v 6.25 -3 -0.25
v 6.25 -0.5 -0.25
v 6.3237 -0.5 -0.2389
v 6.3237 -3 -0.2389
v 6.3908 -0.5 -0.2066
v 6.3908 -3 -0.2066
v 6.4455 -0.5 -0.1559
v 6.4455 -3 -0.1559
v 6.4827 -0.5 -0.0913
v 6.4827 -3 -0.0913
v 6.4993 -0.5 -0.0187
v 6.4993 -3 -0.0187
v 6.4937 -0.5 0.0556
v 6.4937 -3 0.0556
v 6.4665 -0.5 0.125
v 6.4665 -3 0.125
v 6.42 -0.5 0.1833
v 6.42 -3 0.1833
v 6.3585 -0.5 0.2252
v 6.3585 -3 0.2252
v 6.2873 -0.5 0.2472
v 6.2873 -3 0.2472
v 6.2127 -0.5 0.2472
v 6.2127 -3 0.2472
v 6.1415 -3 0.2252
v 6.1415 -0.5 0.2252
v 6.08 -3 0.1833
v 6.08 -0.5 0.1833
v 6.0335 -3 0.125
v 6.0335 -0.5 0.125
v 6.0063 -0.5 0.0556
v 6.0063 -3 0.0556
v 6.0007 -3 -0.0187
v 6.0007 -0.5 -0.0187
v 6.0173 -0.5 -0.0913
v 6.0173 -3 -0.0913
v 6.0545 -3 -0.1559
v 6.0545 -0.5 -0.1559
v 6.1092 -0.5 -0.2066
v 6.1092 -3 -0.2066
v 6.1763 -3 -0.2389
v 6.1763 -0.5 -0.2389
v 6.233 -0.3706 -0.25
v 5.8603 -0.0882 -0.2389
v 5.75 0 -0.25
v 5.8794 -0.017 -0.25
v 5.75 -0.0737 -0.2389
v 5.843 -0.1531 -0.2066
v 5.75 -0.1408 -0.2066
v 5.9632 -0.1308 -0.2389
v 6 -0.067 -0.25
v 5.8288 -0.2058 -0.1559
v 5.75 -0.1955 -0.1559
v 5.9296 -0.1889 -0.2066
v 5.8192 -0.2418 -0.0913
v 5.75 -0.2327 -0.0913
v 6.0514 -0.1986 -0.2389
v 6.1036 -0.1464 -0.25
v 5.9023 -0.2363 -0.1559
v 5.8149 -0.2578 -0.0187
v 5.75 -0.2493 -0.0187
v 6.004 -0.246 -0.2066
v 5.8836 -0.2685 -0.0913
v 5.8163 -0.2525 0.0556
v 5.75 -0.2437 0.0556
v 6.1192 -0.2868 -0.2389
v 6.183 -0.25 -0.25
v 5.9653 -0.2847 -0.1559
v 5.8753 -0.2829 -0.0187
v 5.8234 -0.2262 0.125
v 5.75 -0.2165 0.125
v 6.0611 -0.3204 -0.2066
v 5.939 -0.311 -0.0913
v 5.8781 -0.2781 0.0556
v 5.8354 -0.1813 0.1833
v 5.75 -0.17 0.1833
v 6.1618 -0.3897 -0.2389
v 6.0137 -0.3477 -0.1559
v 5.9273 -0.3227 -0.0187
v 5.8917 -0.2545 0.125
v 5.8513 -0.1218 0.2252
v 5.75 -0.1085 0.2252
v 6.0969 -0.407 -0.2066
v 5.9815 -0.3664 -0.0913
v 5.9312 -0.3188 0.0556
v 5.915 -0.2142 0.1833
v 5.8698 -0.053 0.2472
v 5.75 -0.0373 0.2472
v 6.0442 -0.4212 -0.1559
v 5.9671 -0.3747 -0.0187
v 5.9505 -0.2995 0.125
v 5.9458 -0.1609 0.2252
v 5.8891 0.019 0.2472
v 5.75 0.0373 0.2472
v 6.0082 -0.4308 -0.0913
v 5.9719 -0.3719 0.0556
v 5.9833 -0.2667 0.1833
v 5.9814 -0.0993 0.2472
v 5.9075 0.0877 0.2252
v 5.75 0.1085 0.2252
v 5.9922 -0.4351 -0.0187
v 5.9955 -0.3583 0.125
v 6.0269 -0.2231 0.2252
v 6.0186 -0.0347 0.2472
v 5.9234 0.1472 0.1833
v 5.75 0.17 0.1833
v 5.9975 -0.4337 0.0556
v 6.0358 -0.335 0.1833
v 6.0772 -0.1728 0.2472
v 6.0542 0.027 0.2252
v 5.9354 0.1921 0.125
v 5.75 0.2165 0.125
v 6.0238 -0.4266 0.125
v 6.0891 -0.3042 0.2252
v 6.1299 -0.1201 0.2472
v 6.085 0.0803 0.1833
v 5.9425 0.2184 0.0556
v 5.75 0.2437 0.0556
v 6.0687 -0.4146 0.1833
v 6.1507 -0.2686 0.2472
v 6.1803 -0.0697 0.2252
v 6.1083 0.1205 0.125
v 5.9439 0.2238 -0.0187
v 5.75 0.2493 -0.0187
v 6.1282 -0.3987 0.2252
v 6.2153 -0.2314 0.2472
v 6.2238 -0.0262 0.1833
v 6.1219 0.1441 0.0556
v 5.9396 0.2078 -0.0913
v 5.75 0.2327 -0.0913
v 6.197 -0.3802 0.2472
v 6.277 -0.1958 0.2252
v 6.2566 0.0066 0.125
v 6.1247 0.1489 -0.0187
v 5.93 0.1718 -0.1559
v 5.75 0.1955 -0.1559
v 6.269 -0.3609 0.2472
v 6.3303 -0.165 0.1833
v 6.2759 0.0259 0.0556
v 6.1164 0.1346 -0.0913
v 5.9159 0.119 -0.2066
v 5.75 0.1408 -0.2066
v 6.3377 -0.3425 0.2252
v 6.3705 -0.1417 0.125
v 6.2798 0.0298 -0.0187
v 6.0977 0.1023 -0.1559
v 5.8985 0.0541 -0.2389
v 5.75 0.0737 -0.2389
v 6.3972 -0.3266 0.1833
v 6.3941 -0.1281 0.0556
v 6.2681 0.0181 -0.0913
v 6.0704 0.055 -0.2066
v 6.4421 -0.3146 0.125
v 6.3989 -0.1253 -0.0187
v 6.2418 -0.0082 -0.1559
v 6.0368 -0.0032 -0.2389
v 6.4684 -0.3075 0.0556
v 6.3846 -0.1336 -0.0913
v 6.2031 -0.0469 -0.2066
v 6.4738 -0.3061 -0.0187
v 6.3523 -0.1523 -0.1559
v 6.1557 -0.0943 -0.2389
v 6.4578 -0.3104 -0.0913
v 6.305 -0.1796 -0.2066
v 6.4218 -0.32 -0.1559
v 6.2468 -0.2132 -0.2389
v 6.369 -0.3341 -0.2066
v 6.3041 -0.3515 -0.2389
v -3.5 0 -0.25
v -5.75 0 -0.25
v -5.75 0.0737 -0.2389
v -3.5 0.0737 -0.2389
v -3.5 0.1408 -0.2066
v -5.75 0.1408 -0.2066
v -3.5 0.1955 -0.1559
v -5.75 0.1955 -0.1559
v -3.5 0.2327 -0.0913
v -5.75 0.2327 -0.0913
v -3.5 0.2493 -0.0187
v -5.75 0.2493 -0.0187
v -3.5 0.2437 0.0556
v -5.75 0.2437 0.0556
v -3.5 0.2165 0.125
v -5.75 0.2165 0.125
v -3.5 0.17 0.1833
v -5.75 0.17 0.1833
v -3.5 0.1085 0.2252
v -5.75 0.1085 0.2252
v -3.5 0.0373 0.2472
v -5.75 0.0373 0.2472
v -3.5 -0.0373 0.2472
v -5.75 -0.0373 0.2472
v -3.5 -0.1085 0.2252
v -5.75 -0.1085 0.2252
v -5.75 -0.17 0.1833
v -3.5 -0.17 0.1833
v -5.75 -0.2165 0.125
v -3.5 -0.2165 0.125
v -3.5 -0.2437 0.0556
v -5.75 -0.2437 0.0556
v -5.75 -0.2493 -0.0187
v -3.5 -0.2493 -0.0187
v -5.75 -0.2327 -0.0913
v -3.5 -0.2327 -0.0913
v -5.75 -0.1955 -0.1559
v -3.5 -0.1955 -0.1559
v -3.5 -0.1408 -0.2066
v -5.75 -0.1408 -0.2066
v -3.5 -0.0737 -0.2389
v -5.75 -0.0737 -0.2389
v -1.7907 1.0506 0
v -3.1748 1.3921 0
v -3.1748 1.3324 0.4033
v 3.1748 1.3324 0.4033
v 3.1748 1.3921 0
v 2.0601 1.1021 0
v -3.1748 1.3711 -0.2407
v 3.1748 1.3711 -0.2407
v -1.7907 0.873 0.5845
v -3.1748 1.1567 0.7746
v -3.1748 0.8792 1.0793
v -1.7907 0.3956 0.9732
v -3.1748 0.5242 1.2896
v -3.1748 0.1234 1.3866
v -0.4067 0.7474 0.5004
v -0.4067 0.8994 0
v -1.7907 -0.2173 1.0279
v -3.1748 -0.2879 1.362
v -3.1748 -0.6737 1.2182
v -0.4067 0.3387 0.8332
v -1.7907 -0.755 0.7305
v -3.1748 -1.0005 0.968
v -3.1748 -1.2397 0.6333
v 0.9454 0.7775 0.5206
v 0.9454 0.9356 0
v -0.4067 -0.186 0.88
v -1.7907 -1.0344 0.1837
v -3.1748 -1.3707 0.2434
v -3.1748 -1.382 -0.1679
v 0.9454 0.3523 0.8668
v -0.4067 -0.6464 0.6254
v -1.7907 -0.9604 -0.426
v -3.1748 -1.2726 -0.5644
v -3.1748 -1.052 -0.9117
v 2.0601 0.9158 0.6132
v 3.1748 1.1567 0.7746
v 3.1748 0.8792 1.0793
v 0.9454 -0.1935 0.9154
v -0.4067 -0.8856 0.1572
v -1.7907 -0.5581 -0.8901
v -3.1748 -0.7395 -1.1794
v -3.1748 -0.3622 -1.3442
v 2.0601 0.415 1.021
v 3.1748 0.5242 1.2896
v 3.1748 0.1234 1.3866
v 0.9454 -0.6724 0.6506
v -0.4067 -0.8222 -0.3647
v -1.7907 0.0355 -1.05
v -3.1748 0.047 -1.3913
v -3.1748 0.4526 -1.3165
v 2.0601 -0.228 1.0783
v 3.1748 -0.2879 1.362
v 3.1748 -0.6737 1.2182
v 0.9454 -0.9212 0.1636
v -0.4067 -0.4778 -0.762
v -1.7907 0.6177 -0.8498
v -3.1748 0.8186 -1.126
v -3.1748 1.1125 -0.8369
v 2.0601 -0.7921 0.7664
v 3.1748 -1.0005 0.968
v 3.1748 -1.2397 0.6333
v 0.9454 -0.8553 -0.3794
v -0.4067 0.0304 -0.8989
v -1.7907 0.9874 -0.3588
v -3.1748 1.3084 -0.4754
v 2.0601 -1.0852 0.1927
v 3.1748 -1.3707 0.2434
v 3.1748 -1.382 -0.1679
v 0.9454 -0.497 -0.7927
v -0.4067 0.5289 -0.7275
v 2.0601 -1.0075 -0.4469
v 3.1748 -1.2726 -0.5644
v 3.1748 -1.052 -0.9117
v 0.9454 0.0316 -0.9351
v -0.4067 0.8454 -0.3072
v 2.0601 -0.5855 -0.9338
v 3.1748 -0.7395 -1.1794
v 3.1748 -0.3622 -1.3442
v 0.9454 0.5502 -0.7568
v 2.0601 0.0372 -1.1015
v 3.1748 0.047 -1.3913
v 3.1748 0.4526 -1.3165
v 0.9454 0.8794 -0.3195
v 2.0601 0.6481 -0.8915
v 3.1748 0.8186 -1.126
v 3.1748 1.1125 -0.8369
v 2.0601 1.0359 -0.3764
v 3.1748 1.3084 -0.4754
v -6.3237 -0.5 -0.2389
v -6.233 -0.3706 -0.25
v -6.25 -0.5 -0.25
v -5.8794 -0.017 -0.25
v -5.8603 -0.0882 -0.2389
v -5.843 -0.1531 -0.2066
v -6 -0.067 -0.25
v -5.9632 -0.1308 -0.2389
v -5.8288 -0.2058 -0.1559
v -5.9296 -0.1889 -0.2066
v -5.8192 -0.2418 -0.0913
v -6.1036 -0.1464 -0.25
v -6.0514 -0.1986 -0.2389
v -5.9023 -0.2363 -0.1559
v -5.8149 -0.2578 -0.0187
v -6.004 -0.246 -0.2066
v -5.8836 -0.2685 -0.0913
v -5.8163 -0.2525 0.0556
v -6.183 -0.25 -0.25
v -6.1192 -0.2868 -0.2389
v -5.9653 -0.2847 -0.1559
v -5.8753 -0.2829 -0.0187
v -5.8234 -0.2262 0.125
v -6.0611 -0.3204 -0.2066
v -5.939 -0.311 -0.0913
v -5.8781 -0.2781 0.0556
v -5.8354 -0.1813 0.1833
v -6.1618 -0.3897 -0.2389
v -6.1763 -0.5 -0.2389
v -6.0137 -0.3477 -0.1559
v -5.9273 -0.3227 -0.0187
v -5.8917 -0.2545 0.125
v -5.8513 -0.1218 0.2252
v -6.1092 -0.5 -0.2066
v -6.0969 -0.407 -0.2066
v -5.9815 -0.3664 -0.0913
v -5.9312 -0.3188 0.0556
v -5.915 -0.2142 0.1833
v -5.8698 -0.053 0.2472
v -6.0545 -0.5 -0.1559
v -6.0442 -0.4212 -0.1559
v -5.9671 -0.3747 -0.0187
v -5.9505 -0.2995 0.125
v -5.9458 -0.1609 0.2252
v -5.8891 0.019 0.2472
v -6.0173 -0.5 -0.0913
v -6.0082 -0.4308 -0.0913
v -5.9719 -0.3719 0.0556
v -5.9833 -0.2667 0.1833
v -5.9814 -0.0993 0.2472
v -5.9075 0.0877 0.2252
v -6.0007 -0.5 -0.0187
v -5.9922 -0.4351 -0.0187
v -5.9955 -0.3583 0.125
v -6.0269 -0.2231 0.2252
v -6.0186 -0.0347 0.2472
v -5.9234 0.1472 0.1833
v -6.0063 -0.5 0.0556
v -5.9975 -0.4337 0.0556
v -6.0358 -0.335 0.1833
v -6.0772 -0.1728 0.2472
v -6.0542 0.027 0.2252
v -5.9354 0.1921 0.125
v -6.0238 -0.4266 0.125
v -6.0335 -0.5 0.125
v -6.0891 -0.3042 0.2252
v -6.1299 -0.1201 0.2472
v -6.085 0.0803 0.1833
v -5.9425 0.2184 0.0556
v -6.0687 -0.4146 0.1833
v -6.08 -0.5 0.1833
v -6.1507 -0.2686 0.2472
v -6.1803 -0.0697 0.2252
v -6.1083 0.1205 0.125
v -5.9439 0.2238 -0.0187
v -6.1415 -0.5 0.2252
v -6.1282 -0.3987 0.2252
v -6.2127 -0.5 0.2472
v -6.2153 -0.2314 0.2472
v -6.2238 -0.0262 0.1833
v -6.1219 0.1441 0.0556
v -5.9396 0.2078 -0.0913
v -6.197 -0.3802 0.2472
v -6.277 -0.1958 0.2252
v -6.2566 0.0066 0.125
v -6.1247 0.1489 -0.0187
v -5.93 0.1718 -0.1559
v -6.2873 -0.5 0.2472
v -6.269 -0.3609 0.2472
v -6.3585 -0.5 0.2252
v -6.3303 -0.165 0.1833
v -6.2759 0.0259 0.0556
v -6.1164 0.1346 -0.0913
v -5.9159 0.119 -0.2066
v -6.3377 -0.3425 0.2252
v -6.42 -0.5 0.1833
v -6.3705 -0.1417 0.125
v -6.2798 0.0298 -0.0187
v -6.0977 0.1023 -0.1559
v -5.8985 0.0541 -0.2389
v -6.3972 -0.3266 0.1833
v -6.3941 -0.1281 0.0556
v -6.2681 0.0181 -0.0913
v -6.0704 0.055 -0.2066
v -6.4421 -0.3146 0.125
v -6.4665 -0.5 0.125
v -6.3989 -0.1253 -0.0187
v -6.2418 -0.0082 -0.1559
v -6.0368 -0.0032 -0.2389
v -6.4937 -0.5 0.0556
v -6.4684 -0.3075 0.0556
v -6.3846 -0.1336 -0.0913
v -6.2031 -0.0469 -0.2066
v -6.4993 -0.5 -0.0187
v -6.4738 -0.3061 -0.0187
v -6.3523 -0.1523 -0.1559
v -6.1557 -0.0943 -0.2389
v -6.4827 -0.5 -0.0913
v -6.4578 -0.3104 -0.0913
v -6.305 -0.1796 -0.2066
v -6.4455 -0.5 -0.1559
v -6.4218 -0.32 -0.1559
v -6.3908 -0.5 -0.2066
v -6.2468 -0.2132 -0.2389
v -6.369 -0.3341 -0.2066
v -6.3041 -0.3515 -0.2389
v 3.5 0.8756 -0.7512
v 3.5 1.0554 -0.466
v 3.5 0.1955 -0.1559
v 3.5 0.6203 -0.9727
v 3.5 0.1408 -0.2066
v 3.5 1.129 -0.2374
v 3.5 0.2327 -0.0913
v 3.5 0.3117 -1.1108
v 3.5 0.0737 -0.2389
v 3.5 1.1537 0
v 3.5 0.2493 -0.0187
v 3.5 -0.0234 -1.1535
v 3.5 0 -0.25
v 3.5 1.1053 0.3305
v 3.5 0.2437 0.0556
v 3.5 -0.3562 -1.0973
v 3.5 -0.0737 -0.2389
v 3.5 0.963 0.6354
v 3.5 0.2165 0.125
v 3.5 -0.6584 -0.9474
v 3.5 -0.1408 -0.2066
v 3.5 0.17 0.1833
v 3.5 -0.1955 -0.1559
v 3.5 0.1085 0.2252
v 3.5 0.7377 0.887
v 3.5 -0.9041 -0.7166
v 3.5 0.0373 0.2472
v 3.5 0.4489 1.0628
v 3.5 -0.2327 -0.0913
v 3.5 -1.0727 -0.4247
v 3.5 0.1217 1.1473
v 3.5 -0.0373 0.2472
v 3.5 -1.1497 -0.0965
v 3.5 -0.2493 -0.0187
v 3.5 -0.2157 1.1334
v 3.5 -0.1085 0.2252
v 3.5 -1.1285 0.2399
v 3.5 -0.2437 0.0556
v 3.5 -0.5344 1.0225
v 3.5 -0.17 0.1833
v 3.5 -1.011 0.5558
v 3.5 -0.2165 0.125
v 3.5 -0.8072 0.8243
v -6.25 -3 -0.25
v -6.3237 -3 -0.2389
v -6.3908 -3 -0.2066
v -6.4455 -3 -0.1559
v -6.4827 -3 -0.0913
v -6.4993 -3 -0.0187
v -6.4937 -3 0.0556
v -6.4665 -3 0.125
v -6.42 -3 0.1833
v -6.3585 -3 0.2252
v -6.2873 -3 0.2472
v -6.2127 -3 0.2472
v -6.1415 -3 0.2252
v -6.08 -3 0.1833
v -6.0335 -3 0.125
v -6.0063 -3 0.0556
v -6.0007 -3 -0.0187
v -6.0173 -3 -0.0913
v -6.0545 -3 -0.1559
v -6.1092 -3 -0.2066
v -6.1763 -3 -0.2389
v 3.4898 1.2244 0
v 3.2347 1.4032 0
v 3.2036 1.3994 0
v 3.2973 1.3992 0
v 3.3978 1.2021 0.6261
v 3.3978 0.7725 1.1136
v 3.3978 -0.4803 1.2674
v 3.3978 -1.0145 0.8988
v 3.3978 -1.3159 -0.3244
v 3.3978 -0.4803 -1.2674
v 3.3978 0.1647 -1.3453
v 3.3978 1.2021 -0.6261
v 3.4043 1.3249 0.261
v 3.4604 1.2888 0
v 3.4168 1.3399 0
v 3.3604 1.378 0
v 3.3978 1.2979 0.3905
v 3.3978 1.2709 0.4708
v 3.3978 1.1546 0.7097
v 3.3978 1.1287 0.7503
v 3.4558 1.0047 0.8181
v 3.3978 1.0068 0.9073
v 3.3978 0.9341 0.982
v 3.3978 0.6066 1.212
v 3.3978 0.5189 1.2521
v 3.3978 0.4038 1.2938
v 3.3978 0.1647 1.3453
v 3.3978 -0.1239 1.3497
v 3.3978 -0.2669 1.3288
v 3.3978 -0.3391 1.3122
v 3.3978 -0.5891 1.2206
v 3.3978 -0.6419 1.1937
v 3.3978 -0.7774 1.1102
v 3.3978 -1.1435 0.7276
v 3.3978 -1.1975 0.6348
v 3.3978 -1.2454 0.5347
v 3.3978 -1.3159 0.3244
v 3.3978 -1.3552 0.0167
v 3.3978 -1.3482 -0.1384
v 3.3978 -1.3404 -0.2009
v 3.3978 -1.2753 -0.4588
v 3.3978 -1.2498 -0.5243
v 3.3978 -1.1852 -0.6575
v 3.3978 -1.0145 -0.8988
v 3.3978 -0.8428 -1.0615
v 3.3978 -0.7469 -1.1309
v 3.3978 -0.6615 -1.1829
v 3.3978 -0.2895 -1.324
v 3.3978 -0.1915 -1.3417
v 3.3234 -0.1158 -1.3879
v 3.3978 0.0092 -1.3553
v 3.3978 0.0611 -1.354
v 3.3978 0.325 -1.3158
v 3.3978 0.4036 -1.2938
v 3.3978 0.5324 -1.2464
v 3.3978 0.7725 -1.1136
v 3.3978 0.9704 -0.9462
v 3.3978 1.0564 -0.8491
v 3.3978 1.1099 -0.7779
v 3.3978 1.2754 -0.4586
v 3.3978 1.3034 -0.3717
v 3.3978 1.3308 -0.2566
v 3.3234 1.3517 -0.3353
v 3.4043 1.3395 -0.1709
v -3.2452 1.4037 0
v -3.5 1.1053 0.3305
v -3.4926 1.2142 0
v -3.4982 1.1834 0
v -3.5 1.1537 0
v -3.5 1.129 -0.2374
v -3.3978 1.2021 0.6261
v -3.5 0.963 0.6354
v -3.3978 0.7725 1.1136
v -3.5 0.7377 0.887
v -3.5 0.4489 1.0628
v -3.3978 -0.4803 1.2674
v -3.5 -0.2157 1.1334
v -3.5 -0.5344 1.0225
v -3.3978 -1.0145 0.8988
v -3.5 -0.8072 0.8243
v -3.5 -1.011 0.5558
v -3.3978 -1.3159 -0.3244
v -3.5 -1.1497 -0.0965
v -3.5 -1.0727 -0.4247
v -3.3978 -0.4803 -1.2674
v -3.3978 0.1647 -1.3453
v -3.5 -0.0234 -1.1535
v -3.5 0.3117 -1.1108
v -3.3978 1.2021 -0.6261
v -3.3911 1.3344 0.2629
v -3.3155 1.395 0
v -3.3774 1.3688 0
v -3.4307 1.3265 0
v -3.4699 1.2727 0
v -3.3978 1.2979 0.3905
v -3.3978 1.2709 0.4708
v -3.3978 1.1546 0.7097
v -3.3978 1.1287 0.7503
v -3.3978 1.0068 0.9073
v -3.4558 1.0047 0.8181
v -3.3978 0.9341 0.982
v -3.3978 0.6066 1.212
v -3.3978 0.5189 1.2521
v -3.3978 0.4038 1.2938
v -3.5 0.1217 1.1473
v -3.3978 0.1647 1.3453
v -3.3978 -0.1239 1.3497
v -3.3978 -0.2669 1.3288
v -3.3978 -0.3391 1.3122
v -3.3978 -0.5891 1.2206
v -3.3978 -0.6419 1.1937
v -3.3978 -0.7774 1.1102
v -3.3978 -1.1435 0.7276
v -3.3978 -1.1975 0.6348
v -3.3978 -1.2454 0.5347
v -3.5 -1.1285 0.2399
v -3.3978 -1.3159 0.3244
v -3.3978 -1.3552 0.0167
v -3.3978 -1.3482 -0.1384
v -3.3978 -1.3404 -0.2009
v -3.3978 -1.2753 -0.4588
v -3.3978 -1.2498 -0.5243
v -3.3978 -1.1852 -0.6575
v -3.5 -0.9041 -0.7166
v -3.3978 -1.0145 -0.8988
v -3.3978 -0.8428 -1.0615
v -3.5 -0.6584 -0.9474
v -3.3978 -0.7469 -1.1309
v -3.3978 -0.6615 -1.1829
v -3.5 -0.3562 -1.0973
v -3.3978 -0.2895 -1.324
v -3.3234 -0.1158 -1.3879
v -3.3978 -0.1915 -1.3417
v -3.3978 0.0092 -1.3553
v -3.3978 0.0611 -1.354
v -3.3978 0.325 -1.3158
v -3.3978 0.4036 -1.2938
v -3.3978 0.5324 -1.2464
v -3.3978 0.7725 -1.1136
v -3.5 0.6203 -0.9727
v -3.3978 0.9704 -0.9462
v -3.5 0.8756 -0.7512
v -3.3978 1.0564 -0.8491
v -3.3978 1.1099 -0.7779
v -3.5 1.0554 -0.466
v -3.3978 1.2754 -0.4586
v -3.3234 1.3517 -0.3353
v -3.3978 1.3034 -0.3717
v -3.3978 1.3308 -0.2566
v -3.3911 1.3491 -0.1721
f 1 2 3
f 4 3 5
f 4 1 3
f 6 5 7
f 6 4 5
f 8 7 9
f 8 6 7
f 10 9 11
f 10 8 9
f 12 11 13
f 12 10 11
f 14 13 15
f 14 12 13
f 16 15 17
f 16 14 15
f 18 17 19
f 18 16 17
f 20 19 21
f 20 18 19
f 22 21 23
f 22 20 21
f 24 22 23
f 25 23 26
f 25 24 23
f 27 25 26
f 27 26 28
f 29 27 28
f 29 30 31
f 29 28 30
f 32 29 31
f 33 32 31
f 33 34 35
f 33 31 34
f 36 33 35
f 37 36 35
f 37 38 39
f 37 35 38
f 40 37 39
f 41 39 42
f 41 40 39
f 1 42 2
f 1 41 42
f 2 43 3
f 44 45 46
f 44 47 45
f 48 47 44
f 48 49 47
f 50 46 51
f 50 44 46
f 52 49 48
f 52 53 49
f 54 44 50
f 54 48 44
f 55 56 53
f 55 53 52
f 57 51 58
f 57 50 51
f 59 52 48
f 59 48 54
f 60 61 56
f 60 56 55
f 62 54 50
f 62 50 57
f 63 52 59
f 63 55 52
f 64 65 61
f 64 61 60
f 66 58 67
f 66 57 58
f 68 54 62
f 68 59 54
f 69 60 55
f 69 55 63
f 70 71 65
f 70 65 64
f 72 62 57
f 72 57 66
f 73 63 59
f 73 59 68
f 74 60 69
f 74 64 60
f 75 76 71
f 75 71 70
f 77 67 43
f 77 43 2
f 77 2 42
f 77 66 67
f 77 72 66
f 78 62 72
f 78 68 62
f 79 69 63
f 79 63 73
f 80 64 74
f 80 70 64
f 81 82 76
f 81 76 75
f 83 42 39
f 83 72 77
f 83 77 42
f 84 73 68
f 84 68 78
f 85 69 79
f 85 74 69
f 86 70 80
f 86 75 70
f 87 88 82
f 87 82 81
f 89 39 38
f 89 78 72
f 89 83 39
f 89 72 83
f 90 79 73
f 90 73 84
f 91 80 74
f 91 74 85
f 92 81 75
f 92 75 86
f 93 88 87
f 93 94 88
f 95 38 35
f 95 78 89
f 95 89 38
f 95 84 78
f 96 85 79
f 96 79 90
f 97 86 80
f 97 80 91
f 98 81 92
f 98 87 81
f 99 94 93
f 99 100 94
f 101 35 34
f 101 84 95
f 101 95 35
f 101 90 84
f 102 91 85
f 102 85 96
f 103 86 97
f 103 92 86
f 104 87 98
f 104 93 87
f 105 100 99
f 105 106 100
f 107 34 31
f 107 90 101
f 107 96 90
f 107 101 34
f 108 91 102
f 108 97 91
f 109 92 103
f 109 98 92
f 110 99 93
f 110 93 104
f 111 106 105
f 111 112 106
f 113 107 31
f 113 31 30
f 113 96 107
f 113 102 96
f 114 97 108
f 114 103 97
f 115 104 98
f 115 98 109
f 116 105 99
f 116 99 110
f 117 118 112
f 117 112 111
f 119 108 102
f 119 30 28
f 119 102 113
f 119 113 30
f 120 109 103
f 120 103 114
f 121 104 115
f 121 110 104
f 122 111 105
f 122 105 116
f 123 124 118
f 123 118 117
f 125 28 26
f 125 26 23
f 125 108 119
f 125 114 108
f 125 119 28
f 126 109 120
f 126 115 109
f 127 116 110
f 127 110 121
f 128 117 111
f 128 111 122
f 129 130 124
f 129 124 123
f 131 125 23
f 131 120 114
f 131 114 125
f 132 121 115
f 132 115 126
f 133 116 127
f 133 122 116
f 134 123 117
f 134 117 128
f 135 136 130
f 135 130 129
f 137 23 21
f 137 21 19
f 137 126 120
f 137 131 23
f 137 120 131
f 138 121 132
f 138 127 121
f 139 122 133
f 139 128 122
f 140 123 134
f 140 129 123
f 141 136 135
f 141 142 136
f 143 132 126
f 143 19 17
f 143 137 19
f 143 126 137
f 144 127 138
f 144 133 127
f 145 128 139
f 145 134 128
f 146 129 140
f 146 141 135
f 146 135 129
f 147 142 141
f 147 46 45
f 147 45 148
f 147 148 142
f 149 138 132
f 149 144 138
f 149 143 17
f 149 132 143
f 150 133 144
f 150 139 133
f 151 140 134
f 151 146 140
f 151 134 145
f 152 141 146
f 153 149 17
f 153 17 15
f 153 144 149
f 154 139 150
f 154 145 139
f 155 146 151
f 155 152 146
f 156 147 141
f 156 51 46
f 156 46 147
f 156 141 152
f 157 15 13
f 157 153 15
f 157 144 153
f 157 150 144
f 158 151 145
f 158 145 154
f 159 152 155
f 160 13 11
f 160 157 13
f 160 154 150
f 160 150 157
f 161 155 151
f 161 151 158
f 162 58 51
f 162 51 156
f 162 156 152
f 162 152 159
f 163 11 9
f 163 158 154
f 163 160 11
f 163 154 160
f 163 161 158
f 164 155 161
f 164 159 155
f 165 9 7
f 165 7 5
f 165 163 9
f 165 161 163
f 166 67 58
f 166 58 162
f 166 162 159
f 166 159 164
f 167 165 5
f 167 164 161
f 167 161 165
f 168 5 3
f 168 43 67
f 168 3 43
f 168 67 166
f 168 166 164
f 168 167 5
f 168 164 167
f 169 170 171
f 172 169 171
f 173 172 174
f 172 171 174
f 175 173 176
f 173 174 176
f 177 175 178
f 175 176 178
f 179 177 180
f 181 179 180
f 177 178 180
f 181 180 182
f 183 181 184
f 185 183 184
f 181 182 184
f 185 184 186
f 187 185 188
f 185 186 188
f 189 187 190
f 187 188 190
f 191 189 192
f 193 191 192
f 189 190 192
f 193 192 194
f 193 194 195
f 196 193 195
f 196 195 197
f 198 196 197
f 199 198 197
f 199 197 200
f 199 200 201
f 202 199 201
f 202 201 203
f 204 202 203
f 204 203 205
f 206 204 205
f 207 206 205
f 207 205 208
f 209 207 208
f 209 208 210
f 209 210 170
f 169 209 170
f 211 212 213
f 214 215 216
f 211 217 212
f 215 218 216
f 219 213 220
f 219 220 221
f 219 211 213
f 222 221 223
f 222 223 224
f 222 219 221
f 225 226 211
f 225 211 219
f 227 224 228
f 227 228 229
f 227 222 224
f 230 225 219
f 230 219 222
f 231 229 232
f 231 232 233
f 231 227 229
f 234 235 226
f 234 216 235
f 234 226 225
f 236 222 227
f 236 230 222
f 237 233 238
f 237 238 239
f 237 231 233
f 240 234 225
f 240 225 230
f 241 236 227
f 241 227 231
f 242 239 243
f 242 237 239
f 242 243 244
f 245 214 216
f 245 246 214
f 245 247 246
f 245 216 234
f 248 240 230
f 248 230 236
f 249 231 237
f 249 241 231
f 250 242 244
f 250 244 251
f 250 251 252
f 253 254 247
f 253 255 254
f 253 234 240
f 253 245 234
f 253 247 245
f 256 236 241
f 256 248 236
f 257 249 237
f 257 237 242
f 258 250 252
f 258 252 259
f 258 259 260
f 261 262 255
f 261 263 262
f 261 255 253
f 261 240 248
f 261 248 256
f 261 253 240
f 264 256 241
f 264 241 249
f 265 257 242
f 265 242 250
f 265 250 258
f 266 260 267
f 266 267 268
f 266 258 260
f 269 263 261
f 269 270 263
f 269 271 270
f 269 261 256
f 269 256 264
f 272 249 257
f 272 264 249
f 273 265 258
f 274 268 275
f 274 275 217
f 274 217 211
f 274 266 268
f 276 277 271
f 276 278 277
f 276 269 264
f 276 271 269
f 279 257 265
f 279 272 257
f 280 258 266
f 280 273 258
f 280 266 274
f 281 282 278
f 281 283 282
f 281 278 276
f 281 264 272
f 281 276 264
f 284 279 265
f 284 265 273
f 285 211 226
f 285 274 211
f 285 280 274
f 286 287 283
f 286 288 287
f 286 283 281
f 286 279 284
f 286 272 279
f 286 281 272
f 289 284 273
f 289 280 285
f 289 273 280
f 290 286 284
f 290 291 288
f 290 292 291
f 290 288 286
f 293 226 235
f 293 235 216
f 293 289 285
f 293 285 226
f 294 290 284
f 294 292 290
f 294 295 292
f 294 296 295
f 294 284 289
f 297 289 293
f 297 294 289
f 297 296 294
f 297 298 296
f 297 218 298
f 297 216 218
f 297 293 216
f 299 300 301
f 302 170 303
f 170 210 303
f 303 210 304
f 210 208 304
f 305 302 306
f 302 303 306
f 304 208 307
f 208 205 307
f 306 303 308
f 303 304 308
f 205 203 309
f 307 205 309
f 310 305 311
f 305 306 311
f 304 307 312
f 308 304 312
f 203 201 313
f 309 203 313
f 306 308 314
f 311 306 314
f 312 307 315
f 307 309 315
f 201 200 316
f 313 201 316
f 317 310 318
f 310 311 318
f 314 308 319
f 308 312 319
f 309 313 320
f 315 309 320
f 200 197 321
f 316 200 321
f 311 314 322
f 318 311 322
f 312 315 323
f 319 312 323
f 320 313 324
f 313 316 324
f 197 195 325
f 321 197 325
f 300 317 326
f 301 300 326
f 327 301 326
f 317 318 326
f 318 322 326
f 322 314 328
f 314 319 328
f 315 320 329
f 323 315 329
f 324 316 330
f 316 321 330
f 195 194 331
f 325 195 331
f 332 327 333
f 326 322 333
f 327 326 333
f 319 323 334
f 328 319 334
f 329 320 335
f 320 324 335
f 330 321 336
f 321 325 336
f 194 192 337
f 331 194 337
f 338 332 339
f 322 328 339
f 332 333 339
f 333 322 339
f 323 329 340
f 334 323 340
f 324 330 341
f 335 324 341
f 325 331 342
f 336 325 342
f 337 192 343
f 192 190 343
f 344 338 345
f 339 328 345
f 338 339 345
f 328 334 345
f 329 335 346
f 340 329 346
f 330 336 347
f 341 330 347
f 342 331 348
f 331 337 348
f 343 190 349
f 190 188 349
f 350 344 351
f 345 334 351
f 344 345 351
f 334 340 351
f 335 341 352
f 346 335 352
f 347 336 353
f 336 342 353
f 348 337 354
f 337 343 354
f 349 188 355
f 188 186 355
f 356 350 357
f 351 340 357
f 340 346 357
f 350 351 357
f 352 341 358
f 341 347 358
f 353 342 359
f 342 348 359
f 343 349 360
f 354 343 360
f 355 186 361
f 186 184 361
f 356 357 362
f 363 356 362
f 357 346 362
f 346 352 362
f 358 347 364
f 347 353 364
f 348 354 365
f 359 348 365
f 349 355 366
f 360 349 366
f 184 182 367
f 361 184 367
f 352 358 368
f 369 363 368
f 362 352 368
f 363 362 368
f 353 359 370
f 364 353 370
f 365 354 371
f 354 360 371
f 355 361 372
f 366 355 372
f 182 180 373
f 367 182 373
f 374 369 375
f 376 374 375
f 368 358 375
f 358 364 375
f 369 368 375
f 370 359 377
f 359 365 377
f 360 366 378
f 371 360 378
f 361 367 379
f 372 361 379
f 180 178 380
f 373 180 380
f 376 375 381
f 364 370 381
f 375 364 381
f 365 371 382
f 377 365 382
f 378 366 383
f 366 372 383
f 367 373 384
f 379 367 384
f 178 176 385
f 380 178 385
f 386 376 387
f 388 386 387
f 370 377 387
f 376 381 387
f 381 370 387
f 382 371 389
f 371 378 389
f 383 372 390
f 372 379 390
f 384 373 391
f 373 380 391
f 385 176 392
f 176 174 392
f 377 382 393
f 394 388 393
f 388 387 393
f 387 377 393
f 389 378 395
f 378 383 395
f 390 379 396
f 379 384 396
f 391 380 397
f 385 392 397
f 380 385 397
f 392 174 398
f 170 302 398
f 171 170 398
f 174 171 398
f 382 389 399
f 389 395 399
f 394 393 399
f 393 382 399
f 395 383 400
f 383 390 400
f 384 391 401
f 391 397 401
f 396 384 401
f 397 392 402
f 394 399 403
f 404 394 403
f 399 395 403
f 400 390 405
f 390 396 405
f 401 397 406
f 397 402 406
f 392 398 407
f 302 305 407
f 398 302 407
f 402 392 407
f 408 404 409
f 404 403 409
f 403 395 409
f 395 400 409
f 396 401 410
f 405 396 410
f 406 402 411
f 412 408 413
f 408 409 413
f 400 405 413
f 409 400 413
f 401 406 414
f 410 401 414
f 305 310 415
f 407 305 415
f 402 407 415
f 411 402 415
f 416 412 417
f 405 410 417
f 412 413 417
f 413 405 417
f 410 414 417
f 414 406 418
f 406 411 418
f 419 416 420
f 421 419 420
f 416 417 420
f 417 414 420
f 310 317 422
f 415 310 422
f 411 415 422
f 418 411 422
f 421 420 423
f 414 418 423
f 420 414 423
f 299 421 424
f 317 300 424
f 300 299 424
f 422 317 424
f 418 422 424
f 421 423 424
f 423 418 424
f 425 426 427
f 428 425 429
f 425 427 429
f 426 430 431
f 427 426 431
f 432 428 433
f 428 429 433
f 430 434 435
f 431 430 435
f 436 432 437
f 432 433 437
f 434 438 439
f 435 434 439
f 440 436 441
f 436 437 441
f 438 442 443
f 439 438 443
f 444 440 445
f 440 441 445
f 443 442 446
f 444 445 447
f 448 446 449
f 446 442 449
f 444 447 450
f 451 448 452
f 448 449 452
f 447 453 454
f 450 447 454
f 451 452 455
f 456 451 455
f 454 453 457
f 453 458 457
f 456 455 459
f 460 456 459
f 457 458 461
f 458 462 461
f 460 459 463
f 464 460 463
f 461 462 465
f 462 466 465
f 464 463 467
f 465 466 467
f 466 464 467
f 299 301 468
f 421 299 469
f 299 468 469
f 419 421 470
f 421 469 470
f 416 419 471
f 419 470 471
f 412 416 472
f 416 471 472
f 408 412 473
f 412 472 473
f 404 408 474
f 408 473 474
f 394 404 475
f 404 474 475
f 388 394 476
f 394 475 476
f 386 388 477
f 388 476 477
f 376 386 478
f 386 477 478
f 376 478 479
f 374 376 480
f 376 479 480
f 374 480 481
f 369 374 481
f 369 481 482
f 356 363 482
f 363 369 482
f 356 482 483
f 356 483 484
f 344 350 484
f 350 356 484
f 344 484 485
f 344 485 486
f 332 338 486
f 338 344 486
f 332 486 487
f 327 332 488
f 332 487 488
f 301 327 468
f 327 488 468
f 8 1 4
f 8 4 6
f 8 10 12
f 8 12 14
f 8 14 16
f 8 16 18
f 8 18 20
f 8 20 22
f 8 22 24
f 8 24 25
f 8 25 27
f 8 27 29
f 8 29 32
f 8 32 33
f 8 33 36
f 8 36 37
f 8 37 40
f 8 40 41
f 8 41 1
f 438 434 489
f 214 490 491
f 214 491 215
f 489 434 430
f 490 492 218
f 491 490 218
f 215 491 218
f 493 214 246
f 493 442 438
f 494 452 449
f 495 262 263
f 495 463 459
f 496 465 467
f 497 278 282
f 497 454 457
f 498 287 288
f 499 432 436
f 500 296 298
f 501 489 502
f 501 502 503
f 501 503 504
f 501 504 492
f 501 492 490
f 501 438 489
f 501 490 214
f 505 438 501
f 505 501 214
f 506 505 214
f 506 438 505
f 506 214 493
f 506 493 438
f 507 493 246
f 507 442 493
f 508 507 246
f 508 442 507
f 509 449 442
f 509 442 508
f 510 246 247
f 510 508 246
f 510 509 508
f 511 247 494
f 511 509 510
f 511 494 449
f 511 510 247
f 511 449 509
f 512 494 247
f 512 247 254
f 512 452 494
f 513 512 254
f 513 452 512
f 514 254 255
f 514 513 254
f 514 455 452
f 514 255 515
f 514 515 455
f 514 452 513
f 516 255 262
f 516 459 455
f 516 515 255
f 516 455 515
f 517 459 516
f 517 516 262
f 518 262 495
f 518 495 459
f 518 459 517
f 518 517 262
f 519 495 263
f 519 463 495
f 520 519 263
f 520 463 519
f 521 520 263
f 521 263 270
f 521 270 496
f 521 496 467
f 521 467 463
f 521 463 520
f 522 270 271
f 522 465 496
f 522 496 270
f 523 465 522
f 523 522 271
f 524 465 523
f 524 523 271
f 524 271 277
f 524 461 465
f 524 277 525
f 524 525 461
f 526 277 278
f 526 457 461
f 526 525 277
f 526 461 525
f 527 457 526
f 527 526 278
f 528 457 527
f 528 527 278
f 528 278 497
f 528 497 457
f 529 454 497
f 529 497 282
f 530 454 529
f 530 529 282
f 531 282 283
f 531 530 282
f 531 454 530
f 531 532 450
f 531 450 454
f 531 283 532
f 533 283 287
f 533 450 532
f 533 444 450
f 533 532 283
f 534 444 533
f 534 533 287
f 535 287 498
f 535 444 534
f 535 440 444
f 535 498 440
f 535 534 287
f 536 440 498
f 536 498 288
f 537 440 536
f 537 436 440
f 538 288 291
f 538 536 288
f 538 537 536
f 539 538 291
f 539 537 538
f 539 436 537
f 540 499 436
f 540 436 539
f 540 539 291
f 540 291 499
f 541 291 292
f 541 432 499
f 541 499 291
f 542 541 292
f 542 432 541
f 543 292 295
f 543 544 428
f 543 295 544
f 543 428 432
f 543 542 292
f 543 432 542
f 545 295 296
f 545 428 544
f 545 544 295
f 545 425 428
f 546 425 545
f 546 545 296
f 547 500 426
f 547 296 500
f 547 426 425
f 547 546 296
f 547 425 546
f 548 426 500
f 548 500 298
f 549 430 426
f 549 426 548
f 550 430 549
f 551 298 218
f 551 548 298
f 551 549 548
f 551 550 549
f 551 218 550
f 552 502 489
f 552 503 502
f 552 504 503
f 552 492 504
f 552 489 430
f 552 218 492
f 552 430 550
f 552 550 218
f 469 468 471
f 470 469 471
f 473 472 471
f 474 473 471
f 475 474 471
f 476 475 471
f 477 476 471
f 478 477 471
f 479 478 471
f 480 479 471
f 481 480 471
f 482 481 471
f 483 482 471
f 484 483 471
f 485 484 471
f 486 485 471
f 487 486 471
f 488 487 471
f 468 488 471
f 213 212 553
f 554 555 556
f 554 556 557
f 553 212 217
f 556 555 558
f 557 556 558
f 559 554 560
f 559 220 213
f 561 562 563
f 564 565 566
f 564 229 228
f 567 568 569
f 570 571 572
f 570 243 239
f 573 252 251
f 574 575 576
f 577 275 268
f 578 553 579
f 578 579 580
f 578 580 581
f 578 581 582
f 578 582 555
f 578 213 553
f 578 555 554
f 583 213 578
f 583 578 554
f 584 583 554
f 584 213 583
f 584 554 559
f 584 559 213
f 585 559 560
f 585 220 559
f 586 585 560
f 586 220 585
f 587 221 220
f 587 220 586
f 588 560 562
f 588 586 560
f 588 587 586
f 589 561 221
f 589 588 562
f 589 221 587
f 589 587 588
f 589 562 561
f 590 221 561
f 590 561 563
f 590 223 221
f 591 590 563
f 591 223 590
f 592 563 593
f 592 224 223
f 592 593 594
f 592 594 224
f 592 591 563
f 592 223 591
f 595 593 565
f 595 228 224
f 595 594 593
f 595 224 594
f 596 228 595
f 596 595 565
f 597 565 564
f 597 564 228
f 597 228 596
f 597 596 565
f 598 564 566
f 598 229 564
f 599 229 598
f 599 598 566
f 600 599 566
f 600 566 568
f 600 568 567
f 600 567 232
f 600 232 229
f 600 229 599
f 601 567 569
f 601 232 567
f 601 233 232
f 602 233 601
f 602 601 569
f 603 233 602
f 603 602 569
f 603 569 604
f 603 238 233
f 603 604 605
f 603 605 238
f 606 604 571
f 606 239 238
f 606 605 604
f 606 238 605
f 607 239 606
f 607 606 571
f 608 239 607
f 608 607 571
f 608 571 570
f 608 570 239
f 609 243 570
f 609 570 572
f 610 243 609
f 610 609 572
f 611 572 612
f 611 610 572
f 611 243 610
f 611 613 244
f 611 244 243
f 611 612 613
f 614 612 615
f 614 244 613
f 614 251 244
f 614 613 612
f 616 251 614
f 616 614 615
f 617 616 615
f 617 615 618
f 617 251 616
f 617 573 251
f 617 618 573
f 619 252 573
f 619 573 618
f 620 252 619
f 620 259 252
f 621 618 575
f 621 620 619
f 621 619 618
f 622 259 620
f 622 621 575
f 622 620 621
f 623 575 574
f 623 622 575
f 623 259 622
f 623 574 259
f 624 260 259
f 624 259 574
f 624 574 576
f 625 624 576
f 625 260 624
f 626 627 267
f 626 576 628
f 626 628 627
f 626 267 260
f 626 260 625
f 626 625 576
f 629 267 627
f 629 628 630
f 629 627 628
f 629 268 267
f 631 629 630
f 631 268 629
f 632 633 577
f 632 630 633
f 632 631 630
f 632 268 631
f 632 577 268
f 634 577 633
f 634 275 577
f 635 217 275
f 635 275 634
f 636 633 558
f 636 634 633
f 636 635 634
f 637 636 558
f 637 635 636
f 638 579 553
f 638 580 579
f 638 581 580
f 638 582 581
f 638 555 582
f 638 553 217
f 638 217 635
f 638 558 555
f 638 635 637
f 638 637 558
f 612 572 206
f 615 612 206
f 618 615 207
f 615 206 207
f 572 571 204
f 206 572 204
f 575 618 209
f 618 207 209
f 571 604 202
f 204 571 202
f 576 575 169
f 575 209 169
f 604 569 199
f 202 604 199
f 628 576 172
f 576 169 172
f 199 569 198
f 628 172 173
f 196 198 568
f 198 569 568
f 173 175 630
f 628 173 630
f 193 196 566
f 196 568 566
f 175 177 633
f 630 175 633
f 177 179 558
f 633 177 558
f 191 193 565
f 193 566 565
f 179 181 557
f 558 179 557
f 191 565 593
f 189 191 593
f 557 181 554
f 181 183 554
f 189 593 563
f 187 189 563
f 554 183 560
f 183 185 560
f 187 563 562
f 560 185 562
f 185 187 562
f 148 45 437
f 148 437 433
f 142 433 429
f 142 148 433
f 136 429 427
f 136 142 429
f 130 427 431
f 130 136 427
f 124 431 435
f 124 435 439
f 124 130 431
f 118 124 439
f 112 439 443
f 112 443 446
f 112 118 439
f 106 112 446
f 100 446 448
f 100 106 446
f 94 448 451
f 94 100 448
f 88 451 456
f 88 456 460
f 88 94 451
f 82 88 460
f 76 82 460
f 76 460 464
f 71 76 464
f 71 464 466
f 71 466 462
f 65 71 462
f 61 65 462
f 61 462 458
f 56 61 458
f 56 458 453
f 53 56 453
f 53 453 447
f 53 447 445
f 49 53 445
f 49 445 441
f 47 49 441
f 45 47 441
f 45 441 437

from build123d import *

# Parameters (mm, degrees)
FILLET2_R = 0.25
SKETCH4_R = 0.25


with BuildPart() as part:
    # Sketch1 → Revolve1 (revolve)
    with BuildSketch(Plane.XY):
        with BuildLine():
            Line((-3.5, 0), (3.5, 0))
            Line((3.5, 0), (3.5, 1.5))
            add(Edge.make_bspline(
                [(-3.5, 1.5), (0, 0.282452635), (3.5, 1.5)],
                knots=[0, 0, 0, 1, 1, 1], degree=2))
            Line((-3.5, 1.5), (-3.5, 0))
        make_face()
    revolve(axis=Axis((-3.5, 0, 0), (1, 0, 0)))

    # Fillet2
    fillet2_edges = [part.edges().sort_by_distance(p)[0] for p in [
        (3.5, -1.5, 0),
        (-3.5, -1.5, 0),
    ]]
    fillet(fillet2_edges, radius=FILLET2_R)

    # Sweep1: sweep along a path in Sketch3
    with BuildLine(Plane.XY) as sweep1_path:
        Line((3.5, 0), (5.75, 0))
        ThreePointArc((5.75, 0), (6.103553391, -0.146446609), (6.25, -0.5))
        Line((6.25, -0.5), (6.25, -3))
    # Sketch4 → Sweep1 (sweep)
    with BuildSketch(Plane(origin=(3.5, 0, 0), x_dir=(0, 0, -1), z_dir=(1, 0, 0))):
        Circle(SKETCH4_R)
    sweep1 = sweep(path=sweep1_path.line)

    # Mirror1: Sweep1 across plane
    add(sweep1.mirror(Plane(origin=(0, 0, 0), x_dir=(0, 0, 1), z_dir=(1, 0, 0))))


solid = part.part
